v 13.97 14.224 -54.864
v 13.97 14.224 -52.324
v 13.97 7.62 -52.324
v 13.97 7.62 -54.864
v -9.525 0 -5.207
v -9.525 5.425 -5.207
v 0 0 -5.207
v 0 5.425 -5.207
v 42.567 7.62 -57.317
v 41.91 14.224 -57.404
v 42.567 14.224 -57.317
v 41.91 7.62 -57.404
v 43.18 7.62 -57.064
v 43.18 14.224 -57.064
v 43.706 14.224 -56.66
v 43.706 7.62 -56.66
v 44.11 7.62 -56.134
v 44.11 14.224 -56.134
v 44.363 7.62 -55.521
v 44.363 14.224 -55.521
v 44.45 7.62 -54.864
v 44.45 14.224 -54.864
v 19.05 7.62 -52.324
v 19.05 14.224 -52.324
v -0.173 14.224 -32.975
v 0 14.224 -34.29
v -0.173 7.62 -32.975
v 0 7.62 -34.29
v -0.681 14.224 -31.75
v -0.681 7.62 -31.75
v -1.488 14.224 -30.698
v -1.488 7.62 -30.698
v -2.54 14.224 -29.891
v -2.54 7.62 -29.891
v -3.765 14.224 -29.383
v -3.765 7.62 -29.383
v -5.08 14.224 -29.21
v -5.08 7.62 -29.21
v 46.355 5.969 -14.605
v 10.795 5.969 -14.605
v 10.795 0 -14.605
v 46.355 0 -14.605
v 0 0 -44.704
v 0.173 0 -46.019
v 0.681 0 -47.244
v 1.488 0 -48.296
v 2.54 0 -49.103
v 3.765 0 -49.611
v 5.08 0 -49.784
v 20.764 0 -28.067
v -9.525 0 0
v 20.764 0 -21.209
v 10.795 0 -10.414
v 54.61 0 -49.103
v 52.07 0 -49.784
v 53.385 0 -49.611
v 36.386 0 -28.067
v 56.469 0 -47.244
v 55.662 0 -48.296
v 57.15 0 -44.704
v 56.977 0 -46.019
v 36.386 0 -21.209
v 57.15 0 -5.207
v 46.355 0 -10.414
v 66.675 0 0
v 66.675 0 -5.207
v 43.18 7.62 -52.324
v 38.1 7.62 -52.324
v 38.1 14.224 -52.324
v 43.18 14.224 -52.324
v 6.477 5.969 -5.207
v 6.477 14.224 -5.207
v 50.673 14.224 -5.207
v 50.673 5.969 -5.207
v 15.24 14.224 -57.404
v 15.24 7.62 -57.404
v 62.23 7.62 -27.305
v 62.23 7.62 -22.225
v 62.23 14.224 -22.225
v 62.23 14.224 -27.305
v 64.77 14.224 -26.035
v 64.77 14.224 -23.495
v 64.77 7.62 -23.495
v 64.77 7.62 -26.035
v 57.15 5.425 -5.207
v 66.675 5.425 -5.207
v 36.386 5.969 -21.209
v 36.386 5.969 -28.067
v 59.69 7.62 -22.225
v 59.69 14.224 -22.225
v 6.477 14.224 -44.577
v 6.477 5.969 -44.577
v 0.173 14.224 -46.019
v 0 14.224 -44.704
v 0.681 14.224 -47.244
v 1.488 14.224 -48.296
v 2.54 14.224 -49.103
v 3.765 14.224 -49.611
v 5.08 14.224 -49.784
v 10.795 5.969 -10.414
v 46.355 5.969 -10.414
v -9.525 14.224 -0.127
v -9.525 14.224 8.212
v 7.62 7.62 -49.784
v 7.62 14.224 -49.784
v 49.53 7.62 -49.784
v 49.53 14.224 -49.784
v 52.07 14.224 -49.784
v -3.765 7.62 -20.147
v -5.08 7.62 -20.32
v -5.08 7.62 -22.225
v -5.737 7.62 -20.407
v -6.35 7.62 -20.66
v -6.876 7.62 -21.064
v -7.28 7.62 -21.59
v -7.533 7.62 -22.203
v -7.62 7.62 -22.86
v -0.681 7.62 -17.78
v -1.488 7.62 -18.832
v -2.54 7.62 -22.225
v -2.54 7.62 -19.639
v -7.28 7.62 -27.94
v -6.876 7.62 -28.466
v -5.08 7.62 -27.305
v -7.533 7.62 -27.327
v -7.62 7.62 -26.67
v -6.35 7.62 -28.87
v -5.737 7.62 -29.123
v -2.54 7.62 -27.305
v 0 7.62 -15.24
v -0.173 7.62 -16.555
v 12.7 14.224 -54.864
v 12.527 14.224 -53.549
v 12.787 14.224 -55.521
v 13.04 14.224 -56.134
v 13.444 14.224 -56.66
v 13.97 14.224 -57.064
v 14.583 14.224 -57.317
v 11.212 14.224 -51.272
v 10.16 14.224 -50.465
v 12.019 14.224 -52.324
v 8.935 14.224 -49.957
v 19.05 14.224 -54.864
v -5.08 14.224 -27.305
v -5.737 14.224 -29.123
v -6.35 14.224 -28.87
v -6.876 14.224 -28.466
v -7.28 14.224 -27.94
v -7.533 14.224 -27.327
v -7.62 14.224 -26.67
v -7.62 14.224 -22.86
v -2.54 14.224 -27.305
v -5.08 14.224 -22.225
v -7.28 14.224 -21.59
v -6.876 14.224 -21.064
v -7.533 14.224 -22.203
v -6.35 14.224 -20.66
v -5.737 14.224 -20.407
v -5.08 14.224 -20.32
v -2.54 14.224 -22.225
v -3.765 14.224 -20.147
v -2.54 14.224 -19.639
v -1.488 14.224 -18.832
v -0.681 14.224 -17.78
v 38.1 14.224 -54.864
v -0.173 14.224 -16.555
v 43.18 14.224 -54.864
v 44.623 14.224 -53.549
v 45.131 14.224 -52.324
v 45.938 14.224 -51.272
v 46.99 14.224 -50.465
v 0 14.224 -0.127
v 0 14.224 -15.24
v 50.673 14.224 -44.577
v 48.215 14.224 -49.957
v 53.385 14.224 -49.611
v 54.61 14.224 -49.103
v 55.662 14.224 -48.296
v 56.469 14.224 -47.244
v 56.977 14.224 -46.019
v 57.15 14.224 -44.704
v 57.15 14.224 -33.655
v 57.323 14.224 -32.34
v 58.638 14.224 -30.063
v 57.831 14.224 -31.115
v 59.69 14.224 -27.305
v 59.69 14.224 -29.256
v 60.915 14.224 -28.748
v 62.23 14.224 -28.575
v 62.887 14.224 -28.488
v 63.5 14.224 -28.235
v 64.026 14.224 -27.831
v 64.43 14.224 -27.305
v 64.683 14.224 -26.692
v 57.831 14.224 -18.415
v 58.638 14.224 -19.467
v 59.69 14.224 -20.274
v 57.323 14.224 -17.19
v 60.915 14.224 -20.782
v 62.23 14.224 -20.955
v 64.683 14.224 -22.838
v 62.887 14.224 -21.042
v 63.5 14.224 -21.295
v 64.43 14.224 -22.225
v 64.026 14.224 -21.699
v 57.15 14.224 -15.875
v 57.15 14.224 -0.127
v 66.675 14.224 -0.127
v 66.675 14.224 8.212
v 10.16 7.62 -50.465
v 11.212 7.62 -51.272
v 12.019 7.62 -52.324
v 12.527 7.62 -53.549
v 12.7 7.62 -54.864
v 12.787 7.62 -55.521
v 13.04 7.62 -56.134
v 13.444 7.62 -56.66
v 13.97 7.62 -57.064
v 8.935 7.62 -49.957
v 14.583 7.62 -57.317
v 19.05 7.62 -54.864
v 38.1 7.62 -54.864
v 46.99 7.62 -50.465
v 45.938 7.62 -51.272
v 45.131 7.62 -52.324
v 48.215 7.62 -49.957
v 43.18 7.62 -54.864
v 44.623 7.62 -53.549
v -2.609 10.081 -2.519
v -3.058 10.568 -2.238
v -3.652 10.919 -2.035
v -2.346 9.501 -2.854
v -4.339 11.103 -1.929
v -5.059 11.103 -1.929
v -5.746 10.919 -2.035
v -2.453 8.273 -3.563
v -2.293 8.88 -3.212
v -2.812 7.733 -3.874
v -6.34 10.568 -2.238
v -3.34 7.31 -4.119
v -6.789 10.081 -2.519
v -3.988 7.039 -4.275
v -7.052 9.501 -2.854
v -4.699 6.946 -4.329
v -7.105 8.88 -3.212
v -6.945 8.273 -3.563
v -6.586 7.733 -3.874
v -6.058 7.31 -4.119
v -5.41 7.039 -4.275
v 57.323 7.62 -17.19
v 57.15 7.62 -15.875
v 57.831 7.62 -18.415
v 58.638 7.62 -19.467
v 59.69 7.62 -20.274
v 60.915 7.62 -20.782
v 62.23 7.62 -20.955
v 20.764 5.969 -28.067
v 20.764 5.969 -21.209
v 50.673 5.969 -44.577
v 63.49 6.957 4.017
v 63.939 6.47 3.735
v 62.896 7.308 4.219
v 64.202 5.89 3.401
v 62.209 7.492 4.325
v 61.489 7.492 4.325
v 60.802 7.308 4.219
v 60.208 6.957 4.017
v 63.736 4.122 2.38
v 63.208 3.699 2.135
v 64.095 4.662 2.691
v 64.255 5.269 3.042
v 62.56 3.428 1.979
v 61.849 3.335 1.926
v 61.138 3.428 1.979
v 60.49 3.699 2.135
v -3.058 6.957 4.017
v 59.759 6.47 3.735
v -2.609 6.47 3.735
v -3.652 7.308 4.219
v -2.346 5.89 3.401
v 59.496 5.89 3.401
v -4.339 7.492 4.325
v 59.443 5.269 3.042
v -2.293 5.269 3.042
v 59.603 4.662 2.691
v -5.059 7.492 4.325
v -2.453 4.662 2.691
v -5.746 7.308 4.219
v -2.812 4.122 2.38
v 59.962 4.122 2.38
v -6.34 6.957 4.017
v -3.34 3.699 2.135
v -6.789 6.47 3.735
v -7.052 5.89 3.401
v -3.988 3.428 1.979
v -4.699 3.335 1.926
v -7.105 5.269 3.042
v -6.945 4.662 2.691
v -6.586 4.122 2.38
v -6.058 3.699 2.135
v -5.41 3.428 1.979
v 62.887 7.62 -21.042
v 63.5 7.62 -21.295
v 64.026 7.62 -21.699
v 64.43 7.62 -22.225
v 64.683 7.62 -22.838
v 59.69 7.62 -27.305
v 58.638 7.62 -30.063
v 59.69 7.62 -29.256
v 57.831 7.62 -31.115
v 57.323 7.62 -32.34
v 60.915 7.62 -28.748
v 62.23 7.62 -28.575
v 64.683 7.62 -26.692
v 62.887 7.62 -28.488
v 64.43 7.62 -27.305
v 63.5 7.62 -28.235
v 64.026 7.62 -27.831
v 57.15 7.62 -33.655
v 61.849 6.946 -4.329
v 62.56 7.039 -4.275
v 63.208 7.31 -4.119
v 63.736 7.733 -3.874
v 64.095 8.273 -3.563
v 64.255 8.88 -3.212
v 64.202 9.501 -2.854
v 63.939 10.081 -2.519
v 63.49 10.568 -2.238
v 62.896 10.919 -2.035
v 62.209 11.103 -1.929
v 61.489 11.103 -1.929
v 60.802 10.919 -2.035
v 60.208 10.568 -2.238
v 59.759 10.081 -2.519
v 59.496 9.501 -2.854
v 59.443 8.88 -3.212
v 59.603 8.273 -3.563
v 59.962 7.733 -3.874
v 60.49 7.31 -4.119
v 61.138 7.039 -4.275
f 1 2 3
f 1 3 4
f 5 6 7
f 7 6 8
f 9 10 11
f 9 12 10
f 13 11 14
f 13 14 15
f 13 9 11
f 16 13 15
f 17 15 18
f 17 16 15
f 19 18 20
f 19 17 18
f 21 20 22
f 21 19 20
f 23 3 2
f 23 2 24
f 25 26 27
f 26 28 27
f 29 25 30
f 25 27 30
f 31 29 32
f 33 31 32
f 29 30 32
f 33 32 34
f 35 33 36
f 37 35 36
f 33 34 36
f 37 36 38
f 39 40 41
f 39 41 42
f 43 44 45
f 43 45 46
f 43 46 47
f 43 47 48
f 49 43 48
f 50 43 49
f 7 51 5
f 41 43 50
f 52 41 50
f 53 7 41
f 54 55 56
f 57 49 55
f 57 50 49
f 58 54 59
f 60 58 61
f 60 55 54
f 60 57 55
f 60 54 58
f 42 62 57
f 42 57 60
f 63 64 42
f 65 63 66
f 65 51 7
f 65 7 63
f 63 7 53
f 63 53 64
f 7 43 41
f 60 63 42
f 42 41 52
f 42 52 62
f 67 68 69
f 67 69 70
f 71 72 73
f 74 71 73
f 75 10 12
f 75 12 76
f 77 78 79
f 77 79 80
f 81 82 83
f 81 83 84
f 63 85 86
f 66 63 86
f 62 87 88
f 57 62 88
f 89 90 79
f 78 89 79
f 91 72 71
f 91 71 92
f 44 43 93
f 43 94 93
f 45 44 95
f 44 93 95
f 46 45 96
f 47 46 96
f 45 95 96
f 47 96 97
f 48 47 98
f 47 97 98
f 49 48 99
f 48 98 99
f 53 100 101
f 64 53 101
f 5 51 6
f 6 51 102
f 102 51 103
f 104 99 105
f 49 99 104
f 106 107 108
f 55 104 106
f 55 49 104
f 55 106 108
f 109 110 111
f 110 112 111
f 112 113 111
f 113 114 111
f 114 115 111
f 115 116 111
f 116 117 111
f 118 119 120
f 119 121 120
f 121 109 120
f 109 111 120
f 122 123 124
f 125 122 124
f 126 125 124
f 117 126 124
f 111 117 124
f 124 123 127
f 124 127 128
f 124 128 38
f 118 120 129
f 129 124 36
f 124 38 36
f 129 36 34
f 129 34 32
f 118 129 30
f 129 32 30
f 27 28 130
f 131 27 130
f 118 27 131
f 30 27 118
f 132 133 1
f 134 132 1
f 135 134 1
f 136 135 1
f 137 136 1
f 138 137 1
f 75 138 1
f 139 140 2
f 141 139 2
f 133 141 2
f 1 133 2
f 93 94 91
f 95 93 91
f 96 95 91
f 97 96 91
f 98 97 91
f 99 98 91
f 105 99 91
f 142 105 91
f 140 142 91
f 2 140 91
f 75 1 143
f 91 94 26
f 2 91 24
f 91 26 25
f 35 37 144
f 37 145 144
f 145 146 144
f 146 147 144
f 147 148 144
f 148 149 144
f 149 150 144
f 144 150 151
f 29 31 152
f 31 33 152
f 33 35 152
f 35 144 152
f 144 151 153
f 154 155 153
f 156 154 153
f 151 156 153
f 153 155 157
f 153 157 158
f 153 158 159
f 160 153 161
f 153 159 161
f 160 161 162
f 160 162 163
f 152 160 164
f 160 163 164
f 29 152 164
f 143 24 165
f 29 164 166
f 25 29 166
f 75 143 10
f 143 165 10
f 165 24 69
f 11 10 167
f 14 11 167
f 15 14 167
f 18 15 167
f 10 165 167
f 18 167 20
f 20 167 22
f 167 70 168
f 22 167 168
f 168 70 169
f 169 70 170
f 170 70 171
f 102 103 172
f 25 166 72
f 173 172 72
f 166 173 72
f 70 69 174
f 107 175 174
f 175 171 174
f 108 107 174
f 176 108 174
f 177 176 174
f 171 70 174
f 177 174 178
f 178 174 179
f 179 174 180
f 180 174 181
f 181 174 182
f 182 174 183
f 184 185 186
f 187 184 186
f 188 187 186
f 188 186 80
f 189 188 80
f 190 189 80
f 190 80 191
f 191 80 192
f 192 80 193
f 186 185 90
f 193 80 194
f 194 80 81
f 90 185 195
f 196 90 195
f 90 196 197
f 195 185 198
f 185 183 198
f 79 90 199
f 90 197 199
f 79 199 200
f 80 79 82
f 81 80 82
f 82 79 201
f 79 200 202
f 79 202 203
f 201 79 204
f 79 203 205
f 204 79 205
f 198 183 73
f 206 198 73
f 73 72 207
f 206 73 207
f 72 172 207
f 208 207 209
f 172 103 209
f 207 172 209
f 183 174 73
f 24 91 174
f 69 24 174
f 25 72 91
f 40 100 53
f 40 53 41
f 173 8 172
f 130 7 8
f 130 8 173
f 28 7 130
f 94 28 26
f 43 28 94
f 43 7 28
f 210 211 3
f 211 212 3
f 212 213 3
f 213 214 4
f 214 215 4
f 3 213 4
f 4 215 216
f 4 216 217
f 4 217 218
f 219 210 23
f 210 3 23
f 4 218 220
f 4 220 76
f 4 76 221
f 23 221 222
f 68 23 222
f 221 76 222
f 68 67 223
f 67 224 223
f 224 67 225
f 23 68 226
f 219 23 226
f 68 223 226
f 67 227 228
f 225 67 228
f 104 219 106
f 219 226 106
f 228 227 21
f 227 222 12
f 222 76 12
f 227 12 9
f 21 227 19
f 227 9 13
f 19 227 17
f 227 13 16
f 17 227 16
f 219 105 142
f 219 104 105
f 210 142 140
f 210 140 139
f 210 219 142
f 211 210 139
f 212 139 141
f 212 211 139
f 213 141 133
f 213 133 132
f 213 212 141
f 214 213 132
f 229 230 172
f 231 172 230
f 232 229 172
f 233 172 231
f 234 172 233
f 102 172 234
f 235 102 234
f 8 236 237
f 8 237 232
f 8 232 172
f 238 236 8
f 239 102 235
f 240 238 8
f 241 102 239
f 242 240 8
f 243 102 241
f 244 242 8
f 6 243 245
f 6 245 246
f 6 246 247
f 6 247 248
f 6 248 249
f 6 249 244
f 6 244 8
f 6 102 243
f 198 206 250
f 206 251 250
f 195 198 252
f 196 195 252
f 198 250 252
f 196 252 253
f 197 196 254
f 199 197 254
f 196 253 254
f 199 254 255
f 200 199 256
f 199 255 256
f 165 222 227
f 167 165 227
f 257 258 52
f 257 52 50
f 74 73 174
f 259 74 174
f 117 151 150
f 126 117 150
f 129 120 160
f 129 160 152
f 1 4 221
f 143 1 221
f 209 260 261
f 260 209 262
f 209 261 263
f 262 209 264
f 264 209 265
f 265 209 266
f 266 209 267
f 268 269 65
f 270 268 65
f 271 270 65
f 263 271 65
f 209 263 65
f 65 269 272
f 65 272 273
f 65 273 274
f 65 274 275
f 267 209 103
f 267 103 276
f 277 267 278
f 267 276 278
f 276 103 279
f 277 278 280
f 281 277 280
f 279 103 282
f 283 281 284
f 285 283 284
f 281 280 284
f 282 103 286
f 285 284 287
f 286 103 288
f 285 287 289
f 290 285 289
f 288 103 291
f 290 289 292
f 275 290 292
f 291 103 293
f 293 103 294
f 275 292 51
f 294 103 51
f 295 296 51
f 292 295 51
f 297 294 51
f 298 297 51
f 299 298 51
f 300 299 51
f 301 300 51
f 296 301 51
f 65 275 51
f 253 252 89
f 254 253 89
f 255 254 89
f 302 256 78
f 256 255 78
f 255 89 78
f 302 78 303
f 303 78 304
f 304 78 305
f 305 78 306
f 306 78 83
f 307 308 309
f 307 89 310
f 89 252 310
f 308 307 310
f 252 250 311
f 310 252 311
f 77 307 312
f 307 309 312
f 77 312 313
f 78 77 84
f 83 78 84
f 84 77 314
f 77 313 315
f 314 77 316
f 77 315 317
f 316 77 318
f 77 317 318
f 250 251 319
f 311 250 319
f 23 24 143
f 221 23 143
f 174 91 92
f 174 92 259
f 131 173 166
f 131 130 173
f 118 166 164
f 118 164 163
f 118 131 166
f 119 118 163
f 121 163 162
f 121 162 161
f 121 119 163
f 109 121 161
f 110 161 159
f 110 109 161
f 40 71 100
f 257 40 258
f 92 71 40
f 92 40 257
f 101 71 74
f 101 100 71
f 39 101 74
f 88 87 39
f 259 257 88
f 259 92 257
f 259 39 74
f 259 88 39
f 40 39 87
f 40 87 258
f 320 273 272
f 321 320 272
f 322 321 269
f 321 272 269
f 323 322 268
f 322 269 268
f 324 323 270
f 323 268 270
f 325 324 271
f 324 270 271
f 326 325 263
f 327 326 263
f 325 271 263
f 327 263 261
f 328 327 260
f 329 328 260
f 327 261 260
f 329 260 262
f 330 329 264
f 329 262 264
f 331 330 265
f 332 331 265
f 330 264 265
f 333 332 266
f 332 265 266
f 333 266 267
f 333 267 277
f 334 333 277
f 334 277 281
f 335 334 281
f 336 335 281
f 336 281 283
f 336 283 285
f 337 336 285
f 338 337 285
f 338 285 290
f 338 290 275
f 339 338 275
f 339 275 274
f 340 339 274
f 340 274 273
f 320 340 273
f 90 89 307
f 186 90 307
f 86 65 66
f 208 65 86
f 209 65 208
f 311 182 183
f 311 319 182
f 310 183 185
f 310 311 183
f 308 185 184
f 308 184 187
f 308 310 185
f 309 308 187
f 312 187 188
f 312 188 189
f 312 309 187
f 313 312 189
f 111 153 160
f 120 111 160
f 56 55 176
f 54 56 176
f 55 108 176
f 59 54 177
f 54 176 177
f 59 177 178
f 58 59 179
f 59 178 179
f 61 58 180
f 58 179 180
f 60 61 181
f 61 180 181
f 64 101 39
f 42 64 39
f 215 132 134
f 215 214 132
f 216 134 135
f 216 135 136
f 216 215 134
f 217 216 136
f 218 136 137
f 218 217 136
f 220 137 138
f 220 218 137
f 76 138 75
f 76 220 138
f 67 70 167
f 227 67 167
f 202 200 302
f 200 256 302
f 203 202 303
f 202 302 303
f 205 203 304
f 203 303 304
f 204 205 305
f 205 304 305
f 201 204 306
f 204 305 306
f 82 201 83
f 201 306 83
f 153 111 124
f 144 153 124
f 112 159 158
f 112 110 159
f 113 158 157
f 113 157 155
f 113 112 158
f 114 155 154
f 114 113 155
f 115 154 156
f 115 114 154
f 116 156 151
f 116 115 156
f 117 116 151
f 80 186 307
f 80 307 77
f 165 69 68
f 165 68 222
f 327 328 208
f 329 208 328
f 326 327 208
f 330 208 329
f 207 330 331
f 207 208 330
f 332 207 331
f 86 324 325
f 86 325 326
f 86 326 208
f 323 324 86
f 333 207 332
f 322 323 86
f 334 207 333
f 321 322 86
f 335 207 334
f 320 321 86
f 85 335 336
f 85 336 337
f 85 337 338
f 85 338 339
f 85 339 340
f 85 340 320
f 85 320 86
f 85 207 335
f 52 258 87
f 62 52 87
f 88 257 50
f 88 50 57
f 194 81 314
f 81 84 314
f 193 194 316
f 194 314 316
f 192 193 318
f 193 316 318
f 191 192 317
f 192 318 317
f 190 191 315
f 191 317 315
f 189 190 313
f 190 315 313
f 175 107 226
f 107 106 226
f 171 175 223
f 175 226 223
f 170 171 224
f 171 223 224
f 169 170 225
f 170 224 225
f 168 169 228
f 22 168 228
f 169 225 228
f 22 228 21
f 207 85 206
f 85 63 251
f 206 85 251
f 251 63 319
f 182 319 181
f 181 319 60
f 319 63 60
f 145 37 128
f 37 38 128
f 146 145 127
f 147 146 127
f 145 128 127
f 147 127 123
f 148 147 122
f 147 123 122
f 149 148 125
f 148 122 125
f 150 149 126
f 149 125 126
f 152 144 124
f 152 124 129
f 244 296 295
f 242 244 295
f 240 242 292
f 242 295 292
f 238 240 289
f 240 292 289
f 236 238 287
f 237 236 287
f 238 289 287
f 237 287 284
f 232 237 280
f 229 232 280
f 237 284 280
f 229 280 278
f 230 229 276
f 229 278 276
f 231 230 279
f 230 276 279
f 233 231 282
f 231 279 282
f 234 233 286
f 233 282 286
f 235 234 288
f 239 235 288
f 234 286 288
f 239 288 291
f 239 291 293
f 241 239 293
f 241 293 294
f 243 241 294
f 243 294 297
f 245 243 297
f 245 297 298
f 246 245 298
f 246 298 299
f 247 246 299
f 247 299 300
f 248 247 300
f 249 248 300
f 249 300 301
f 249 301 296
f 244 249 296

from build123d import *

# Parameters (mm, degrees)
SKETCH2_W           = 57.15
SKETCH2_H           = 49.784
BOSS_EXTRUDE1_DEPTH = 14.224
SKETCH3_W           = 44.196
SKETCH3_H           = 39.37
CUT_EXTRUDE1_DEPTH  = 8.255
SKETCH4_W           = 35.56
SKETCH4_H           = 4.191
SKETCH4_W_2         = 15.621
SKETCH4_H_2         = 6.858
CUT_EXTRUDE2_DEPTH  = 8.255
SKETCH5_W           = 7.62
SKETCH5_H           = 8.89
SKETCH5_H_2         = 7.62
BOSS_EXTRUDE2_DEPTH = 6.604
SKETCH6_W           = 2.54
SKETCH6_H           = 5.08
SKETCH6_W_2         = 5.08
SKETCH6_H_2         = 2.54
CUT_EXTRUDE3_DEPTH  = 6.604
FILLET1_R           = 5.08
FILLET2_R           = 2.54
SKETCH7_W           = 76.2
SKETCH7_H           = 14.224
SKETCH7_R           = 2.38125
BOSS_EXTRUDE3_DEPTH = 5.207
BOSS_EXTRUDE4_DEPTH = 76.2
SKETCH9_R           = 2.413
CUT_EXTRUDE4_DEPTH  = 25.4
CHAMFER1_SIZE       = 5.08
CHAMFER1_SIZE_2     = 8.798818102
CHAMFER2_SIZE       = 5.08
CHAMFER2_SIZE_2     = 8.798818102
FILLET3_R           = 5.08
FILLET4_R           = 5.08


# Some blends are built 0.0001 mm under size
with BuildPart() as part:
    # Sketch2 → Boss-Extrude1 (new body)
    with BuildSketch(Plane(origin=(0, 0, 0), x_dir=(1, 0, 0), z_dir=(0, 1, 0))):
        with Locations((28.575, 24.892)):
            Rectangle(SKETCH2_W, SKETCH2_H)
    extrude(amount=BOSS_EXTRUDE1_DEPTH)

    # Sketch3 → Cut-Extrude1 (cut)
    with BuildSketch(Plane(origin=(0, 14.224, 0), x_dir=(1, 0, 0), z_dir=(0, 1, 0))):
        with Locations((28.575, 24.892)):
            Rectangle(SKETCH3_W, SKETCH3_H)
    extrude(amount=-CUT_EXTRUDE1_DEPTH, mode=Mode.SUBTRACT)

    # Sketch4 → Cut-Extrude2 (cut)
    with BuildSketch(Plane(origin=(0, 5.969, 0), x_dir=(1, 0, 0), z_dir=(0, 1, 0))):
        with Locations((28.575, 12.5095)):
            Rectangle(SKETCH4_W, SKETCH4_H)
        with Locations((28.575, 24.638)):
            Rectangle(SKETCH4_W_2, SKETCH4_H_2)
    extrude(amount=-CUT_EXTRUDE2_DEPTH, mode=Mode.SUBTRACT)

    # Sketch5 → Boss-Extrude2 (add)
    with BuildSketch(Plane(origin=(0, 14.224, 0), x_dir=(1, 0, 0), z_dir=(0, 1, 0))):
        with Locations((-3.81, 24.765)):
            Rectangle(SKETCH5_W, SKETCH5_H)
        Polygon((12.7, 49.784), (36.83, 49.784), (44.45, 49.784), (44.45, 57.404), (36.83, 57.404), (12.7, 57.404), align=None)
        with Locations((60.96, 24.765)):
            Rectangle(SKETCH5_W, SKETCH5_H_2)
    extrude(amount=-BOSS_EXTRUDE2_DEPTH)

    # Sketch6 → Cut-Extrude3 (cut)
    with BuildSketch(Plane(origin=(0, 14.224, 0), x_dir=(1, 0, 0), z_dir=(0, 1, 0))):
        with Locations((-3.81, 24.765)):
            Rectangle(SKETCH6_W, SKETCH6_H)
        with Locations((60.96, 24.765)):
            Rectangle(SKETCH6_W, SKETCH6_H)
        with Locations((16.51, 53.594)):
            Rectangle(SKETCH6_W_2, SKETCH6_H_2)
        with Locations((40.64, 53.594)):
            Rectangle(SKETCH6_W_2, SKETCH6_H_2)
    extrude(amount=-CUT_EXTRUDE3_DEPTH, mode=Mode.SUBTRACT)

    # Fillet1
    fillet1_edges = [part.edges().sort_by_distance(p)[0] for p in [
        (0, 7.112, -49.784),
        (57.15, 7.112, -49.784),
        (57.15, 7.112, 0),
        (0, 7.112, 0),
    ]]
    fillet(fillet1_edges, radius=FILLET1_R)

    # Fillet2
    fillet2_edges = [part.edges().sort_by_distance(p)[0] for p in [
        (-7.62, 10.922, -20.32),
        (-7.62, 10.922, -29.21),
        (12.7, 10.922, -57.404),
        (44.45, 10.922, -57.404),
        (64.77, 10.922, -28.575),
        (64.77, 10.922, -20.955),
    ]]
    fillet(fillet2_edges, radius=FILLET2_R)

    # Sketch7 → Boss-Extrude3 (add)
    with BuildSketch(Plane.XY):
        with Locations((28.575, 7.112)):
            Rectangle(SKETCH7_W, SKETCH7_H)
        with Locations((-5.461, 7.112)):
            Circle(SKETCH7_R, mode=Mode.SUBTRACT)
        with Locations((62.611, 7.112)):
            Circle(SKETCH7_R, mode=Mode.SUBTRACT)
    extrude(amount=-BOSS_EXTRUDE3_DEPTH)

    # Sketch8 → Boss-Extrude4 (add)
    with BuildSketch(Plane.ZY.offset(9.525)):
        Polygon((-5.207, 0), (-5.207, 14.224), (8.212230229, 14.224), (0, 0), align=None)
    extrude(amount=-BOSS_EXTRUDE4_DEPTH)

    # Sketch9 → Cut-Extrude4 (cut)
    with BuildSketch(Plane(origin=(0, 0, 0), x_dir=(1, 0, 0), z_dir=(0, -0.5000000000000043, 0.8660254037844363))):
        with Locations(Location((-4.699, 6.264460458, 0), (0, 0, 270))):
            Circle(SKETCH9_R)
        with Locations(Location((61.849, 6.264460458, 0), (0, 0, 270))):
            Circle(SKETCH9_R)
    extrude(amount=-CUT_EXTRUDE4_DEPTH, mode=Mode.SUBTRACT)

    # Chamfer1
    # the kernel refuses this chamfer: 8.798818102, 5.08 mm, written as the material it takes off along each edge
    with BuildSketch(Plane(origin=(57.15, 14.224, -5.207), x_dir=(0, 0.05789386240267539, 0.9983227437537924), z_dir=(1, 0, 0))) as chamfer1_piece_1:
        Polygon((CHAMFER1_SIZE * 0.998322743754, CHAMFER1_SIZE * 0.0578938624027), (-CHAMFER1_SIZE_2 * 0.0578938624056, CHAMFER1_SIZE_2 * 0.998322743805), (0, 0), align=None)
    extrude(amount=32.288296971, mode=Mode.SUBTRACT)

    # Chamfer2
    # the kernel refuses this chamfer: 8.798818102, 5.08 mm, written as the material it takes off along each edge
    with BuildSketch(Plane(origin=(-32.288296971, 14.224, -5.207), x_dir=(0, 0.05789386240267139, 0.9983227437537925), z_dir=(1, 0, 0))) as chamfer2_piece_1:
        Polygon((CHAMFER2_SIZE * 0.998322743754, CHAMFER2_SIZE * 0.0578938624027), (-CHAMFER2_SIZE_2 * 0.0578938624056, CHAMFER2_SIZE_2 * 0.998322743805), (0, 0), align=None)
    extrude(amount=32.288296971, mode=Mode.SUBTRACT)

    # Fillet3
    fillet3_edges = [part.edges().sort_by_distance(p)[0] for p in [
        (44.45, 10.922, -49.784),
        (12.7, 10.922, -49.784),
    ]]
    fillet(fillet3_edges, radius=FILLET3_R - 0.0001)  # a hair under: the kernel refuses the full size

    # Fillet4
    fillet4_edges = [part.edges().sort_by_distance(p)[0] for p in [
        (57.15, 10.922, -20.955),
        (57.15, 10.922, -28.575),
        (0, 10.922, -29.21),
        (0, 10.922, -20.32),
    ]]
    fillet(fillet4_edges, radius=FILLET4_R - 0.0001)  # a hair under: the kernel refuses the full size


solid = part.part
